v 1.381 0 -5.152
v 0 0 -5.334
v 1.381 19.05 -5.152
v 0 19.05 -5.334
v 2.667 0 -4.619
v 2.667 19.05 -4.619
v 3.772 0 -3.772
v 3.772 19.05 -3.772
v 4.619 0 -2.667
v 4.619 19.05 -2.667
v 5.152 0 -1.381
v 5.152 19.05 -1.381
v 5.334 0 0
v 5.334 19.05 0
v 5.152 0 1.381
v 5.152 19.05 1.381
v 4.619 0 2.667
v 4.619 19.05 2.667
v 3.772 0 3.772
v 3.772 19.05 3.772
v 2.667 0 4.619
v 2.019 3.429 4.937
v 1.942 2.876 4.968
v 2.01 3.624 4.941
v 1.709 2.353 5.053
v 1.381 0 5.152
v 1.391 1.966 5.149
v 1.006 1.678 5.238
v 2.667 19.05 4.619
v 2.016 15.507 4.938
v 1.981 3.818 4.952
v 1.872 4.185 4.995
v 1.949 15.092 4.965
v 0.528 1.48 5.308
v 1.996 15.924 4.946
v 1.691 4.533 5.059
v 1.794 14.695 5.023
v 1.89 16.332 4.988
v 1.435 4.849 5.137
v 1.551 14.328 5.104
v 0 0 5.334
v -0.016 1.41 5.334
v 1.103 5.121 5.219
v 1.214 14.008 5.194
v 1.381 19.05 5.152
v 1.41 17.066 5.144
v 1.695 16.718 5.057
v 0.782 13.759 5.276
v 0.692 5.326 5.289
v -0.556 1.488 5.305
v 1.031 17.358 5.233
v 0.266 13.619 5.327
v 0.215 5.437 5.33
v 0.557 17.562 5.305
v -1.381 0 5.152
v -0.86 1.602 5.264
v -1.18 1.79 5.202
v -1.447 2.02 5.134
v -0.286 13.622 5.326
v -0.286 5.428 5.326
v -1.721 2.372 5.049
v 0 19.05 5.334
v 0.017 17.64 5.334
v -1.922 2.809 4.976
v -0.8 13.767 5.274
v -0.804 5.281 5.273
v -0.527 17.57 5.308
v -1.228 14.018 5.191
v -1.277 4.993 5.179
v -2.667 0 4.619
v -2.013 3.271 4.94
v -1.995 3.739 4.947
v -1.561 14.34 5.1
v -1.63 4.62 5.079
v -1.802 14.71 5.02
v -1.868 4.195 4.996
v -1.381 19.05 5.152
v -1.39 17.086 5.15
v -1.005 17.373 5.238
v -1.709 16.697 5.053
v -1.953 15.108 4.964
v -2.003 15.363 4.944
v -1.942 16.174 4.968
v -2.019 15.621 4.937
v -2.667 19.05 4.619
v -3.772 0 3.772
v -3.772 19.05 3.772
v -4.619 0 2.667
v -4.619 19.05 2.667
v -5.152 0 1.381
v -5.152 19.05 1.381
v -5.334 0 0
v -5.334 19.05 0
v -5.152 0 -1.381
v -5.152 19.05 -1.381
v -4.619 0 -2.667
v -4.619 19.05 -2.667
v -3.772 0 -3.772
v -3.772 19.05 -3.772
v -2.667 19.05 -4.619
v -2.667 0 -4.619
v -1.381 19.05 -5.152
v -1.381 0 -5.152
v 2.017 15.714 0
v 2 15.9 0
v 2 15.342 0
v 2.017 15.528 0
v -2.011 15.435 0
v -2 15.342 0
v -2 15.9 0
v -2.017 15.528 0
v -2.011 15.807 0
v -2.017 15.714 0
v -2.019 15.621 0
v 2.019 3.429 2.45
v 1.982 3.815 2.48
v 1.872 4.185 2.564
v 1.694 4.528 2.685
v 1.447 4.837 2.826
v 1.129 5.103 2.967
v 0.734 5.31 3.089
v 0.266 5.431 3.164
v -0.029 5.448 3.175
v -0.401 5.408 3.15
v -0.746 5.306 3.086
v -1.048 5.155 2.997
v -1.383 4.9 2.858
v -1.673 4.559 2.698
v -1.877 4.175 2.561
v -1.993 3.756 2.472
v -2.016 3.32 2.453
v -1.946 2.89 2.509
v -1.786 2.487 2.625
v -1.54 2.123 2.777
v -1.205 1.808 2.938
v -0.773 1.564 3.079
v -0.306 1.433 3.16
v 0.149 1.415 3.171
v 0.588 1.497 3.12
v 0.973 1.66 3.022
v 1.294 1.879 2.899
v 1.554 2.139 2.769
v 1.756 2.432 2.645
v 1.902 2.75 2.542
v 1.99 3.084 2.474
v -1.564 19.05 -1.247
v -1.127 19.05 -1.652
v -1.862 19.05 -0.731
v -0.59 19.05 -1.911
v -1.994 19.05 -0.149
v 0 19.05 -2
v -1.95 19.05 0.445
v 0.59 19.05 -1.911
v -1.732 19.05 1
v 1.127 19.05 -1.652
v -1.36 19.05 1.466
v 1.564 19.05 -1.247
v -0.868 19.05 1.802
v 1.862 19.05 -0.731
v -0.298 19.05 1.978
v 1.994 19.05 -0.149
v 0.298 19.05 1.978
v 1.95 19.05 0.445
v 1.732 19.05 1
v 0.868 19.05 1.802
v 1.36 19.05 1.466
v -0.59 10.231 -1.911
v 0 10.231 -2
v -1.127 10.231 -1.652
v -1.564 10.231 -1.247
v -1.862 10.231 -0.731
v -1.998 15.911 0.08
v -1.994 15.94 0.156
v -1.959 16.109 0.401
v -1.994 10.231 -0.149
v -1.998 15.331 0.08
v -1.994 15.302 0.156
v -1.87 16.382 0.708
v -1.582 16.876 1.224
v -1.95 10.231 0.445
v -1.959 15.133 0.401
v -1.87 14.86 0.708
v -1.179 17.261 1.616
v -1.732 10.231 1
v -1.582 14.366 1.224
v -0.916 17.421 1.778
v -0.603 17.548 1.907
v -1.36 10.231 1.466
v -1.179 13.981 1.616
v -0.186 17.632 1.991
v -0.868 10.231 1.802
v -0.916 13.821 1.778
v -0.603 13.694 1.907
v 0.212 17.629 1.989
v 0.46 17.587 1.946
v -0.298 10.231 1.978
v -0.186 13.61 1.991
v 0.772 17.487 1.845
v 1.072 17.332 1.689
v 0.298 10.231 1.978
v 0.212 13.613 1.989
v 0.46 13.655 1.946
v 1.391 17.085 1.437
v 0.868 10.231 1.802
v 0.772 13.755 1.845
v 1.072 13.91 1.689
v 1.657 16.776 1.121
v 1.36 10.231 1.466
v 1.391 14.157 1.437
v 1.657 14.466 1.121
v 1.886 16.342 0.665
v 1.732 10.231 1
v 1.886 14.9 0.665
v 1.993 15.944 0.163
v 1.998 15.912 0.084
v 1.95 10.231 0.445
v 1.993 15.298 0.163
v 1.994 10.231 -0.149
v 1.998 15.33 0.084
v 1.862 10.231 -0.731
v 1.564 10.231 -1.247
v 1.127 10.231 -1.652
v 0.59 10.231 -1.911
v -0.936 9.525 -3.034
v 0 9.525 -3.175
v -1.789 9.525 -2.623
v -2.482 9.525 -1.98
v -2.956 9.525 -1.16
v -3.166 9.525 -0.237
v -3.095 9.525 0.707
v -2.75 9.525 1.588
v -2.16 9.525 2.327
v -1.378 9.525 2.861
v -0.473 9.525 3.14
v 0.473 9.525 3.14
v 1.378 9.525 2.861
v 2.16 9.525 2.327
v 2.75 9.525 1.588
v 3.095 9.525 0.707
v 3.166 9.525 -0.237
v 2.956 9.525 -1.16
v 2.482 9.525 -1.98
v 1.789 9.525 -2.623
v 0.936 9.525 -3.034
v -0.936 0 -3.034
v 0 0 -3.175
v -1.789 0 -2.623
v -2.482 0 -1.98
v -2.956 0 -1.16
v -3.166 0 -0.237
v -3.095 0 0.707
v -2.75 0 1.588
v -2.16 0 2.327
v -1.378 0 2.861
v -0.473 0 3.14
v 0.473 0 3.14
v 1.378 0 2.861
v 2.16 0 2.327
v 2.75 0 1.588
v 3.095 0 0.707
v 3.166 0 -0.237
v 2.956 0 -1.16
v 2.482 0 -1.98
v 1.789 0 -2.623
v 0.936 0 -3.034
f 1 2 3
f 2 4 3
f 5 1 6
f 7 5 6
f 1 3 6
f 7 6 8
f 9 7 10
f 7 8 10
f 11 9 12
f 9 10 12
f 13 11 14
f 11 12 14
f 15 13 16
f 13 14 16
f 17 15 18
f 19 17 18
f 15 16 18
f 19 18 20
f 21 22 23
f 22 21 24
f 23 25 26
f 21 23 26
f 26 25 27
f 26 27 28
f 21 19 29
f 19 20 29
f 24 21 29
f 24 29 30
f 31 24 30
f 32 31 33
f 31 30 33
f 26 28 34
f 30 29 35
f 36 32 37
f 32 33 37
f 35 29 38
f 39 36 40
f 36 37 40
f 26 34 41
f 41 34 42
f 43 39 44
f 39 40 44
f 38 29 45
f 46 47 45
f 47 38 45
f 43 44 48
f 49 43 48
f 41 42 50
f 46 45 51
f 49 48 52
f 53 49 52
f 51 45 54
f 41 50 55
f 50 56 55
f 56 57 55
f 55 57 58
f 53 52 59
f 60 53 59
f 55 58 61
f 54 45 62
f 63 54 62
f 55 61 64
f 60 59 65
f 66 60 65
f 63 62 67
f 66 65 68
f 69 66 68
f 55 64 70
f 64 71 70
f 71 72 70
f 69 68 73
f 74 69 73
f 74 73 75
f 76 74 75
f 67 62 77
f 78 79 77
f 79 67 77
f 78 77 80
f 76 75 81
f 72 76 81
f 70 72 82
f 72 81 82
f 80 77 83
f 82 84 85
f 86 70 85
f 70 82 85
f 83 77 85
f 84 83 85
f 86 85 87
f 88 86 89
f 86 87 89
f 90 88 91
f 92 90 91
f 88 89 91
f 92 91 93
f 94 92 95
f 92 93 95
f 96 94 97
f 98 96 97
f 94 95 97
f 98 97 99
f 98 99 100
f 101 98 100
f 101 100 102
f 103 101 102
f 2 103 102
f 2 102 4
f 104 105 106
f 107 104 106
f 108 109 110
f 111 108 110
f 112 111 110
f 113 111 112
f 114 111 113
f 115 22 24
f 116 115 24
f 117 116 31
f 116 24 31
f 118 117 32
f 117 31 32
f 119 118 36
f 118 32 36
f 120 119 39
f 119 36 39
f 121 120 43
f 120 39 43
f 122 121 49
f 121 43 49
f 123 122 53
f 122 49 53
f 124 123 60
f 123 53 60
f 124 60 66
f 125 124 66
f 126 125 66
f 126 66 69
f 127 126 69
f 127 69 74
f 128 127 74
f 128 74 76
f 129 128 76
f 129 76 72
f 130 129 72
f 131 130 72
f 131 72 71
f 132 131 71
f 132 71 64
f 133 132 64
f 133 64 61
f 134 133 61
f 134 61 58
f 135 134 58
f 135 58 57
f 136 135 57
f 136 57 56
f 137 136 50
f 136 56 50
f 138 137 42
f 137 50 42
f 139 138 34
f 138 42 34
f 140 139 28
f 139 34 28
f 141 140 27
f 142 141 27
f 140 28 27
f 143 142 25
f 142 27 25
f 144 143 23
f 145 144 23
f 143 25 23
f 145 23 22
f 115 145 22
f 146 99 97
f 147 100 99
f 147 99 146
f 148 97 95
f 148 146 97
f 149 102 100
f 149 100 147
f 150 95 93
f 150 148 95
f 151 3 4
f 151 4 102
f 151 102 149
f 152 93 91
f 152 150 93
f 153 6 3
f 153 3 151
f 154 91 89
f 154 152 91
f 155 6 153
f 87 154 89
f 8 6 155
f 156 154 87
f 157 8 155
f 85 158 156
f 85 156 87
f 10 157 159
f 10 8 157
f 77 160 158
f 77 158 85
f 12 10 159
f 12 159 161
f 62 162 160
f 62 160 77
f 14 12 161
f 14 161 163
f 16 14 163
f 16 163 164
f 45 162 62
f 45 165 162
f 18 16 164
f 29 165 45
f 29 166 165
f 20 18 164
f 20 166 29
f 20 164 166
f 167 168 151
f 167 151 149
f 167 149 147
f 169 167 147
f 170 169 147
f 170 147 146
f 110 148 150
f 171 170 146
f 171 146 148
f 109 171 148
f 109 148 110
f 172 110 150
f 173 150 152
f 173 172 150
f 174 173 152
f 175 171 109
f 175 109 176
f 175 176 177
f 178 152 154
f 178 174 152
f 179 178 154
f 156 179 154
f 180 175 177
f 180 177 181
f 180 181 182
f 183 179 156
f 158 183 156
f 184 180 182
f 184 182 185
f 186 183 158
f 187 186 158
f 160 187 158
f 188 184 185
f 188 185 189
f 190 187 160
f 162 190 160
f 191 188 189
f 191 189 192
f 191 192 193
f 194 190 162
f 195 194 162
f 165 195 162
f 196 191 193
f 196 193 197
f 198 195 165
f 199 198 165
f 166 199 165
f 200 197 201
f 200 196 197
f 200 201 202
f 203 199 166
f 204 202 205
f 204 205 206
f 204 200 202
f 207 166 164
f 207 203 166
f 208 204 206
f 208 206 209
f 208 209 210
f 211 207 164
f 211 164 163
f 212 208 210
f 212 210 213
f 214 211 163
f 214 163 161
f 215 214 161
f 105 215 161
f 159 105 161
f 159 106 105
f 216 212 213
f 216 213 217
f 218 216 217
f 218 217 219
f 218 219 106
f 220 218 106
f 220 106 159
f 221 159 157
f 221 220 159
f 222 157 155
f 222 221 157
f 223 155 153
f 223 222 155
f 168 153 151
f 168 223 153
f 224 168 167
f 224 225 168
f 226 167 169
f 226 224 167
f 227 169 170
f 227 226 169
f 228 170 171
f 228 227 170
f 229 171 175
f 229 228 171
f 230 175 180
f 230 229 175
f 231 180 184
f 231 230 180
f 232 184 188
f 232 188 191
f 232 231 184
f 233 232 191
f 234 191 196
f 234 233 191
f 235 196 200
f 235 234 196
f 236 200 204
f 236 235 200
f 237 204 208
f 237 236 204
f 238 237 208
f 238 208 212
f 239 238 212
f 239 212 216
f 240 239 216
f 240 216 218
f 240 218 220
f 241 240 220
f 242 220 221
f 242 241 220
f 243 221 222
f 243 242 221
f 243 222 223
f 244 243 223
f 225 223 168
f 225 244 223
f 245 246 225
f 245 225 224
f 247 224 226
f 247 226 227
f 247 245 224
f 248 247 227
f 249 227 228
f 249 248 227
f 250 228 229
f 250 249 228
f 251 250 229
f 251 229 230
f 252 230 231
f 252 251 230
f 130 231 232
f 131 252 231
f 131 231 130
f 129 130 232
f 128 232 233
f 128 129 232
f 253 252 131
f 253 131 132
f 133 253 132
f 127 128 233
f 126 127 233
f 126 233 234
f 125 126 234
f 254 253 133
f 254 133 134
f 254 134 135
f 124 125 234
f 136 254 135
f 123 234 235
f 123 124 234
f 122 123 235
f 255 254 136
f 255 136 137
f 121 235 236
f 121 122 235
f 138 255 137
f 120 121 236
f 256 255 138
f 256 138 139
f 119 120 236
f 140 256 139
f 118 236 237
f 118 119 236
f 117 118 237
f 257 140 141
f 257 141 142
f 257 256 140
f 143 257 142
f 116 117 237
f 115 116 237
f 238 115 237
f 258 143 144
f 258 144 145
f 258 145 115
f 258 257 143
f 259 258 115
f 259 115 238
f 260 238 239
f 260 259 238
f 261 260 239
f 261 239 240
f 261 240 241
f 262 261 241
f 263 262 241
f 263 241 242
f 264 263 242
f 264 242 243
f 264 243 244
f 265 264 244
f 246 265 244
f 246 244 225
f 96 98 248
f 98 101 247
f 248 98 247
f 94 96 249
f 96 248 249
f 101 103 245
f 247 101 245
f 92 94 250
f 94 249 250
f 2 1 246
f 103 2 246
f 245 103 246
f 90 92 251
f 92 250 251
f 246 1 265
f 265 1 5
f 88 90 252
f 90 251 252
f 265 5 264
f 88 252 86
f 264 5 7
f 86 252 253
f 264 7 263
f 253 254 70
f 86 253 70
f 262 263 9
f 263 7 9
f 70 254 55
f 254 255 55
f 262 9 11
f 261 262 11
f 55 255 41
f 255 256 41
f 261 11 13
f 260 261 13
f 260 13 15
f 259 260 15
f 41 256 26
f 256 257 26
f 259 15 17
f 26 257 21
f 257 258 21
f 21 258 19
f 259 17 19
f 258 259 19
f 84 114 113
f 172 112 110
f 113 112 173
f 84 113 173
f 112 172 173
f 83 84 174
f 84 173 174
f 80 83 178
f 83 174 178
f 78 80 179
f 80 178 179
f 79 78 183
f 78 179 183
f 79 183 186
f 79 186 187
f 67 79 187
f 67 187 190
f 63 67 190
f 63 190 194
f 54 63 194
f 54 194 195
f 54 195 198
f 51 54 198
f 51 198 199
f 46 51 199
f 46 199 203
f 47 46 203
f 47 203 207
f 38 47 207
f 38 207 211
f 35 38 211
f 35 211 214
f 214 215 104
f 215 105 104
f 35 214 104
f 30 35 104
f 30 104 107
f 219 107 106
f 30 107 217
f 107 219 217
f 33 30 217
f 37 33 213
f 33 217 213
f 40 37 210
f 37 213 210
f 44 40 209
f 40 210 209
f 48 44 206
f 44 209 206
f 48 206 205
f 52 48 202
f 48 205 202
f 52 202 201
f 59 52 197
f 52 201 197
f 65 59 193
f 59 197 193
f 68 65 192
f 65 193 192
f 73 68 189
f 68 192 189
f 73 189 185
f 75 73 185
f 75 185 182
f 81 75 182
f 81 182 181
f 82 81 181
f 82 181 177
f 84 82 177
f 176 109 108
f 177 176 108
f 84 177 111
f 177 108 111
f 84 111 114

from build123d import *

# Parameters (mm, degrees)
SKETCH1_W                        = 5.334
SKETCH1_H                        = 19.05
F_21_0_159_DIAMETER_HOLE1_D      = 4.0386
F_21_0_159_DIAMETER_HOLE1_DEPTH  = 5.334
F_21_0_159_DIAMETER_HOLE2_REACH  = 21.654
F_21_0_159_DIAMETER_HOLE2_BORE_R = 2.0193


with BuildPart() as part:
    # Sketch1 → Revolve1 (revolve)
    with BuildSketch(Plane.XY, mode=Mode.PRIVATE) as revolve1_sk:
        with Locations((2.667, 9.525)):
            Rectangle(SKETCH1_W, SKETCH1_H)
    revolve(revolve1_sk.sketch.rotate(Axis((0, 19.05, 0), (0, -1, 0)), 270), axis=Axis((0, 19.05, 0), (0, -1, 0)))

    # Sketch2 → CSK for #6 Flat Head Machine Screw (100)1 (revolve, cut)
    with BuildSketch(Plane(origin=(0, 0, 0), x_dir=(0, 0, -1), z_dir=(1, 0, 0))):
        Polygon((0, 0), (0, 19.05), (2, 19.05), (2, 10.231011227), (3.175, 9.525), (3.175, 0), align=None)
    revolve(axis=Axis((0, -6.35, 0), (0, 1, 0)), mode=Mode.SUBTRACT)

    # #21 (0.159) Diameter Hole1
    with Locations(Plane(origin=(0, 15.621, 5.334), x_dir=(1, 0, 0), z_dir=(0, 0, 1))):
        with Locations((0, 0)):
            Hole(F_21_0_159_DIAMETER_HOLE1_D / 2, depth=F_21_0_159_DIAMETER_HOLE1_DEPTH)

    # #21 (0.159) Diameter Hole2 bore (on position points) → #21 (0.159) Diameter Hole2 (cut, up to next)
    with BuildSketch(Plane(origin=(0, 3.429, 5.334), x_dir=(1, 0, 0), z_dir=(0, 0, 1)), mode=Mode.PRIVATE) as f_21_0_159_diameter_hole2_sk1:
        Circle(F_21_0_159_DIAMETER_HOLE2_BORE_R)
    f_21_0_159_diameter_hole2_tool1 = extrude(f_21_0_159_diameter_hole2_sk1.sketch, amount=-F_21_0_159_DIAMETER_HOLE2_REACH, mode=Mode.PRIVATE) & part.part
    add(f_21_0_159_diameter_hole2_tool1.solids().sort_by_distance((0, 3.429, 5.334))[0], mode=Mode.SUBTRACT)


solid = part.part
